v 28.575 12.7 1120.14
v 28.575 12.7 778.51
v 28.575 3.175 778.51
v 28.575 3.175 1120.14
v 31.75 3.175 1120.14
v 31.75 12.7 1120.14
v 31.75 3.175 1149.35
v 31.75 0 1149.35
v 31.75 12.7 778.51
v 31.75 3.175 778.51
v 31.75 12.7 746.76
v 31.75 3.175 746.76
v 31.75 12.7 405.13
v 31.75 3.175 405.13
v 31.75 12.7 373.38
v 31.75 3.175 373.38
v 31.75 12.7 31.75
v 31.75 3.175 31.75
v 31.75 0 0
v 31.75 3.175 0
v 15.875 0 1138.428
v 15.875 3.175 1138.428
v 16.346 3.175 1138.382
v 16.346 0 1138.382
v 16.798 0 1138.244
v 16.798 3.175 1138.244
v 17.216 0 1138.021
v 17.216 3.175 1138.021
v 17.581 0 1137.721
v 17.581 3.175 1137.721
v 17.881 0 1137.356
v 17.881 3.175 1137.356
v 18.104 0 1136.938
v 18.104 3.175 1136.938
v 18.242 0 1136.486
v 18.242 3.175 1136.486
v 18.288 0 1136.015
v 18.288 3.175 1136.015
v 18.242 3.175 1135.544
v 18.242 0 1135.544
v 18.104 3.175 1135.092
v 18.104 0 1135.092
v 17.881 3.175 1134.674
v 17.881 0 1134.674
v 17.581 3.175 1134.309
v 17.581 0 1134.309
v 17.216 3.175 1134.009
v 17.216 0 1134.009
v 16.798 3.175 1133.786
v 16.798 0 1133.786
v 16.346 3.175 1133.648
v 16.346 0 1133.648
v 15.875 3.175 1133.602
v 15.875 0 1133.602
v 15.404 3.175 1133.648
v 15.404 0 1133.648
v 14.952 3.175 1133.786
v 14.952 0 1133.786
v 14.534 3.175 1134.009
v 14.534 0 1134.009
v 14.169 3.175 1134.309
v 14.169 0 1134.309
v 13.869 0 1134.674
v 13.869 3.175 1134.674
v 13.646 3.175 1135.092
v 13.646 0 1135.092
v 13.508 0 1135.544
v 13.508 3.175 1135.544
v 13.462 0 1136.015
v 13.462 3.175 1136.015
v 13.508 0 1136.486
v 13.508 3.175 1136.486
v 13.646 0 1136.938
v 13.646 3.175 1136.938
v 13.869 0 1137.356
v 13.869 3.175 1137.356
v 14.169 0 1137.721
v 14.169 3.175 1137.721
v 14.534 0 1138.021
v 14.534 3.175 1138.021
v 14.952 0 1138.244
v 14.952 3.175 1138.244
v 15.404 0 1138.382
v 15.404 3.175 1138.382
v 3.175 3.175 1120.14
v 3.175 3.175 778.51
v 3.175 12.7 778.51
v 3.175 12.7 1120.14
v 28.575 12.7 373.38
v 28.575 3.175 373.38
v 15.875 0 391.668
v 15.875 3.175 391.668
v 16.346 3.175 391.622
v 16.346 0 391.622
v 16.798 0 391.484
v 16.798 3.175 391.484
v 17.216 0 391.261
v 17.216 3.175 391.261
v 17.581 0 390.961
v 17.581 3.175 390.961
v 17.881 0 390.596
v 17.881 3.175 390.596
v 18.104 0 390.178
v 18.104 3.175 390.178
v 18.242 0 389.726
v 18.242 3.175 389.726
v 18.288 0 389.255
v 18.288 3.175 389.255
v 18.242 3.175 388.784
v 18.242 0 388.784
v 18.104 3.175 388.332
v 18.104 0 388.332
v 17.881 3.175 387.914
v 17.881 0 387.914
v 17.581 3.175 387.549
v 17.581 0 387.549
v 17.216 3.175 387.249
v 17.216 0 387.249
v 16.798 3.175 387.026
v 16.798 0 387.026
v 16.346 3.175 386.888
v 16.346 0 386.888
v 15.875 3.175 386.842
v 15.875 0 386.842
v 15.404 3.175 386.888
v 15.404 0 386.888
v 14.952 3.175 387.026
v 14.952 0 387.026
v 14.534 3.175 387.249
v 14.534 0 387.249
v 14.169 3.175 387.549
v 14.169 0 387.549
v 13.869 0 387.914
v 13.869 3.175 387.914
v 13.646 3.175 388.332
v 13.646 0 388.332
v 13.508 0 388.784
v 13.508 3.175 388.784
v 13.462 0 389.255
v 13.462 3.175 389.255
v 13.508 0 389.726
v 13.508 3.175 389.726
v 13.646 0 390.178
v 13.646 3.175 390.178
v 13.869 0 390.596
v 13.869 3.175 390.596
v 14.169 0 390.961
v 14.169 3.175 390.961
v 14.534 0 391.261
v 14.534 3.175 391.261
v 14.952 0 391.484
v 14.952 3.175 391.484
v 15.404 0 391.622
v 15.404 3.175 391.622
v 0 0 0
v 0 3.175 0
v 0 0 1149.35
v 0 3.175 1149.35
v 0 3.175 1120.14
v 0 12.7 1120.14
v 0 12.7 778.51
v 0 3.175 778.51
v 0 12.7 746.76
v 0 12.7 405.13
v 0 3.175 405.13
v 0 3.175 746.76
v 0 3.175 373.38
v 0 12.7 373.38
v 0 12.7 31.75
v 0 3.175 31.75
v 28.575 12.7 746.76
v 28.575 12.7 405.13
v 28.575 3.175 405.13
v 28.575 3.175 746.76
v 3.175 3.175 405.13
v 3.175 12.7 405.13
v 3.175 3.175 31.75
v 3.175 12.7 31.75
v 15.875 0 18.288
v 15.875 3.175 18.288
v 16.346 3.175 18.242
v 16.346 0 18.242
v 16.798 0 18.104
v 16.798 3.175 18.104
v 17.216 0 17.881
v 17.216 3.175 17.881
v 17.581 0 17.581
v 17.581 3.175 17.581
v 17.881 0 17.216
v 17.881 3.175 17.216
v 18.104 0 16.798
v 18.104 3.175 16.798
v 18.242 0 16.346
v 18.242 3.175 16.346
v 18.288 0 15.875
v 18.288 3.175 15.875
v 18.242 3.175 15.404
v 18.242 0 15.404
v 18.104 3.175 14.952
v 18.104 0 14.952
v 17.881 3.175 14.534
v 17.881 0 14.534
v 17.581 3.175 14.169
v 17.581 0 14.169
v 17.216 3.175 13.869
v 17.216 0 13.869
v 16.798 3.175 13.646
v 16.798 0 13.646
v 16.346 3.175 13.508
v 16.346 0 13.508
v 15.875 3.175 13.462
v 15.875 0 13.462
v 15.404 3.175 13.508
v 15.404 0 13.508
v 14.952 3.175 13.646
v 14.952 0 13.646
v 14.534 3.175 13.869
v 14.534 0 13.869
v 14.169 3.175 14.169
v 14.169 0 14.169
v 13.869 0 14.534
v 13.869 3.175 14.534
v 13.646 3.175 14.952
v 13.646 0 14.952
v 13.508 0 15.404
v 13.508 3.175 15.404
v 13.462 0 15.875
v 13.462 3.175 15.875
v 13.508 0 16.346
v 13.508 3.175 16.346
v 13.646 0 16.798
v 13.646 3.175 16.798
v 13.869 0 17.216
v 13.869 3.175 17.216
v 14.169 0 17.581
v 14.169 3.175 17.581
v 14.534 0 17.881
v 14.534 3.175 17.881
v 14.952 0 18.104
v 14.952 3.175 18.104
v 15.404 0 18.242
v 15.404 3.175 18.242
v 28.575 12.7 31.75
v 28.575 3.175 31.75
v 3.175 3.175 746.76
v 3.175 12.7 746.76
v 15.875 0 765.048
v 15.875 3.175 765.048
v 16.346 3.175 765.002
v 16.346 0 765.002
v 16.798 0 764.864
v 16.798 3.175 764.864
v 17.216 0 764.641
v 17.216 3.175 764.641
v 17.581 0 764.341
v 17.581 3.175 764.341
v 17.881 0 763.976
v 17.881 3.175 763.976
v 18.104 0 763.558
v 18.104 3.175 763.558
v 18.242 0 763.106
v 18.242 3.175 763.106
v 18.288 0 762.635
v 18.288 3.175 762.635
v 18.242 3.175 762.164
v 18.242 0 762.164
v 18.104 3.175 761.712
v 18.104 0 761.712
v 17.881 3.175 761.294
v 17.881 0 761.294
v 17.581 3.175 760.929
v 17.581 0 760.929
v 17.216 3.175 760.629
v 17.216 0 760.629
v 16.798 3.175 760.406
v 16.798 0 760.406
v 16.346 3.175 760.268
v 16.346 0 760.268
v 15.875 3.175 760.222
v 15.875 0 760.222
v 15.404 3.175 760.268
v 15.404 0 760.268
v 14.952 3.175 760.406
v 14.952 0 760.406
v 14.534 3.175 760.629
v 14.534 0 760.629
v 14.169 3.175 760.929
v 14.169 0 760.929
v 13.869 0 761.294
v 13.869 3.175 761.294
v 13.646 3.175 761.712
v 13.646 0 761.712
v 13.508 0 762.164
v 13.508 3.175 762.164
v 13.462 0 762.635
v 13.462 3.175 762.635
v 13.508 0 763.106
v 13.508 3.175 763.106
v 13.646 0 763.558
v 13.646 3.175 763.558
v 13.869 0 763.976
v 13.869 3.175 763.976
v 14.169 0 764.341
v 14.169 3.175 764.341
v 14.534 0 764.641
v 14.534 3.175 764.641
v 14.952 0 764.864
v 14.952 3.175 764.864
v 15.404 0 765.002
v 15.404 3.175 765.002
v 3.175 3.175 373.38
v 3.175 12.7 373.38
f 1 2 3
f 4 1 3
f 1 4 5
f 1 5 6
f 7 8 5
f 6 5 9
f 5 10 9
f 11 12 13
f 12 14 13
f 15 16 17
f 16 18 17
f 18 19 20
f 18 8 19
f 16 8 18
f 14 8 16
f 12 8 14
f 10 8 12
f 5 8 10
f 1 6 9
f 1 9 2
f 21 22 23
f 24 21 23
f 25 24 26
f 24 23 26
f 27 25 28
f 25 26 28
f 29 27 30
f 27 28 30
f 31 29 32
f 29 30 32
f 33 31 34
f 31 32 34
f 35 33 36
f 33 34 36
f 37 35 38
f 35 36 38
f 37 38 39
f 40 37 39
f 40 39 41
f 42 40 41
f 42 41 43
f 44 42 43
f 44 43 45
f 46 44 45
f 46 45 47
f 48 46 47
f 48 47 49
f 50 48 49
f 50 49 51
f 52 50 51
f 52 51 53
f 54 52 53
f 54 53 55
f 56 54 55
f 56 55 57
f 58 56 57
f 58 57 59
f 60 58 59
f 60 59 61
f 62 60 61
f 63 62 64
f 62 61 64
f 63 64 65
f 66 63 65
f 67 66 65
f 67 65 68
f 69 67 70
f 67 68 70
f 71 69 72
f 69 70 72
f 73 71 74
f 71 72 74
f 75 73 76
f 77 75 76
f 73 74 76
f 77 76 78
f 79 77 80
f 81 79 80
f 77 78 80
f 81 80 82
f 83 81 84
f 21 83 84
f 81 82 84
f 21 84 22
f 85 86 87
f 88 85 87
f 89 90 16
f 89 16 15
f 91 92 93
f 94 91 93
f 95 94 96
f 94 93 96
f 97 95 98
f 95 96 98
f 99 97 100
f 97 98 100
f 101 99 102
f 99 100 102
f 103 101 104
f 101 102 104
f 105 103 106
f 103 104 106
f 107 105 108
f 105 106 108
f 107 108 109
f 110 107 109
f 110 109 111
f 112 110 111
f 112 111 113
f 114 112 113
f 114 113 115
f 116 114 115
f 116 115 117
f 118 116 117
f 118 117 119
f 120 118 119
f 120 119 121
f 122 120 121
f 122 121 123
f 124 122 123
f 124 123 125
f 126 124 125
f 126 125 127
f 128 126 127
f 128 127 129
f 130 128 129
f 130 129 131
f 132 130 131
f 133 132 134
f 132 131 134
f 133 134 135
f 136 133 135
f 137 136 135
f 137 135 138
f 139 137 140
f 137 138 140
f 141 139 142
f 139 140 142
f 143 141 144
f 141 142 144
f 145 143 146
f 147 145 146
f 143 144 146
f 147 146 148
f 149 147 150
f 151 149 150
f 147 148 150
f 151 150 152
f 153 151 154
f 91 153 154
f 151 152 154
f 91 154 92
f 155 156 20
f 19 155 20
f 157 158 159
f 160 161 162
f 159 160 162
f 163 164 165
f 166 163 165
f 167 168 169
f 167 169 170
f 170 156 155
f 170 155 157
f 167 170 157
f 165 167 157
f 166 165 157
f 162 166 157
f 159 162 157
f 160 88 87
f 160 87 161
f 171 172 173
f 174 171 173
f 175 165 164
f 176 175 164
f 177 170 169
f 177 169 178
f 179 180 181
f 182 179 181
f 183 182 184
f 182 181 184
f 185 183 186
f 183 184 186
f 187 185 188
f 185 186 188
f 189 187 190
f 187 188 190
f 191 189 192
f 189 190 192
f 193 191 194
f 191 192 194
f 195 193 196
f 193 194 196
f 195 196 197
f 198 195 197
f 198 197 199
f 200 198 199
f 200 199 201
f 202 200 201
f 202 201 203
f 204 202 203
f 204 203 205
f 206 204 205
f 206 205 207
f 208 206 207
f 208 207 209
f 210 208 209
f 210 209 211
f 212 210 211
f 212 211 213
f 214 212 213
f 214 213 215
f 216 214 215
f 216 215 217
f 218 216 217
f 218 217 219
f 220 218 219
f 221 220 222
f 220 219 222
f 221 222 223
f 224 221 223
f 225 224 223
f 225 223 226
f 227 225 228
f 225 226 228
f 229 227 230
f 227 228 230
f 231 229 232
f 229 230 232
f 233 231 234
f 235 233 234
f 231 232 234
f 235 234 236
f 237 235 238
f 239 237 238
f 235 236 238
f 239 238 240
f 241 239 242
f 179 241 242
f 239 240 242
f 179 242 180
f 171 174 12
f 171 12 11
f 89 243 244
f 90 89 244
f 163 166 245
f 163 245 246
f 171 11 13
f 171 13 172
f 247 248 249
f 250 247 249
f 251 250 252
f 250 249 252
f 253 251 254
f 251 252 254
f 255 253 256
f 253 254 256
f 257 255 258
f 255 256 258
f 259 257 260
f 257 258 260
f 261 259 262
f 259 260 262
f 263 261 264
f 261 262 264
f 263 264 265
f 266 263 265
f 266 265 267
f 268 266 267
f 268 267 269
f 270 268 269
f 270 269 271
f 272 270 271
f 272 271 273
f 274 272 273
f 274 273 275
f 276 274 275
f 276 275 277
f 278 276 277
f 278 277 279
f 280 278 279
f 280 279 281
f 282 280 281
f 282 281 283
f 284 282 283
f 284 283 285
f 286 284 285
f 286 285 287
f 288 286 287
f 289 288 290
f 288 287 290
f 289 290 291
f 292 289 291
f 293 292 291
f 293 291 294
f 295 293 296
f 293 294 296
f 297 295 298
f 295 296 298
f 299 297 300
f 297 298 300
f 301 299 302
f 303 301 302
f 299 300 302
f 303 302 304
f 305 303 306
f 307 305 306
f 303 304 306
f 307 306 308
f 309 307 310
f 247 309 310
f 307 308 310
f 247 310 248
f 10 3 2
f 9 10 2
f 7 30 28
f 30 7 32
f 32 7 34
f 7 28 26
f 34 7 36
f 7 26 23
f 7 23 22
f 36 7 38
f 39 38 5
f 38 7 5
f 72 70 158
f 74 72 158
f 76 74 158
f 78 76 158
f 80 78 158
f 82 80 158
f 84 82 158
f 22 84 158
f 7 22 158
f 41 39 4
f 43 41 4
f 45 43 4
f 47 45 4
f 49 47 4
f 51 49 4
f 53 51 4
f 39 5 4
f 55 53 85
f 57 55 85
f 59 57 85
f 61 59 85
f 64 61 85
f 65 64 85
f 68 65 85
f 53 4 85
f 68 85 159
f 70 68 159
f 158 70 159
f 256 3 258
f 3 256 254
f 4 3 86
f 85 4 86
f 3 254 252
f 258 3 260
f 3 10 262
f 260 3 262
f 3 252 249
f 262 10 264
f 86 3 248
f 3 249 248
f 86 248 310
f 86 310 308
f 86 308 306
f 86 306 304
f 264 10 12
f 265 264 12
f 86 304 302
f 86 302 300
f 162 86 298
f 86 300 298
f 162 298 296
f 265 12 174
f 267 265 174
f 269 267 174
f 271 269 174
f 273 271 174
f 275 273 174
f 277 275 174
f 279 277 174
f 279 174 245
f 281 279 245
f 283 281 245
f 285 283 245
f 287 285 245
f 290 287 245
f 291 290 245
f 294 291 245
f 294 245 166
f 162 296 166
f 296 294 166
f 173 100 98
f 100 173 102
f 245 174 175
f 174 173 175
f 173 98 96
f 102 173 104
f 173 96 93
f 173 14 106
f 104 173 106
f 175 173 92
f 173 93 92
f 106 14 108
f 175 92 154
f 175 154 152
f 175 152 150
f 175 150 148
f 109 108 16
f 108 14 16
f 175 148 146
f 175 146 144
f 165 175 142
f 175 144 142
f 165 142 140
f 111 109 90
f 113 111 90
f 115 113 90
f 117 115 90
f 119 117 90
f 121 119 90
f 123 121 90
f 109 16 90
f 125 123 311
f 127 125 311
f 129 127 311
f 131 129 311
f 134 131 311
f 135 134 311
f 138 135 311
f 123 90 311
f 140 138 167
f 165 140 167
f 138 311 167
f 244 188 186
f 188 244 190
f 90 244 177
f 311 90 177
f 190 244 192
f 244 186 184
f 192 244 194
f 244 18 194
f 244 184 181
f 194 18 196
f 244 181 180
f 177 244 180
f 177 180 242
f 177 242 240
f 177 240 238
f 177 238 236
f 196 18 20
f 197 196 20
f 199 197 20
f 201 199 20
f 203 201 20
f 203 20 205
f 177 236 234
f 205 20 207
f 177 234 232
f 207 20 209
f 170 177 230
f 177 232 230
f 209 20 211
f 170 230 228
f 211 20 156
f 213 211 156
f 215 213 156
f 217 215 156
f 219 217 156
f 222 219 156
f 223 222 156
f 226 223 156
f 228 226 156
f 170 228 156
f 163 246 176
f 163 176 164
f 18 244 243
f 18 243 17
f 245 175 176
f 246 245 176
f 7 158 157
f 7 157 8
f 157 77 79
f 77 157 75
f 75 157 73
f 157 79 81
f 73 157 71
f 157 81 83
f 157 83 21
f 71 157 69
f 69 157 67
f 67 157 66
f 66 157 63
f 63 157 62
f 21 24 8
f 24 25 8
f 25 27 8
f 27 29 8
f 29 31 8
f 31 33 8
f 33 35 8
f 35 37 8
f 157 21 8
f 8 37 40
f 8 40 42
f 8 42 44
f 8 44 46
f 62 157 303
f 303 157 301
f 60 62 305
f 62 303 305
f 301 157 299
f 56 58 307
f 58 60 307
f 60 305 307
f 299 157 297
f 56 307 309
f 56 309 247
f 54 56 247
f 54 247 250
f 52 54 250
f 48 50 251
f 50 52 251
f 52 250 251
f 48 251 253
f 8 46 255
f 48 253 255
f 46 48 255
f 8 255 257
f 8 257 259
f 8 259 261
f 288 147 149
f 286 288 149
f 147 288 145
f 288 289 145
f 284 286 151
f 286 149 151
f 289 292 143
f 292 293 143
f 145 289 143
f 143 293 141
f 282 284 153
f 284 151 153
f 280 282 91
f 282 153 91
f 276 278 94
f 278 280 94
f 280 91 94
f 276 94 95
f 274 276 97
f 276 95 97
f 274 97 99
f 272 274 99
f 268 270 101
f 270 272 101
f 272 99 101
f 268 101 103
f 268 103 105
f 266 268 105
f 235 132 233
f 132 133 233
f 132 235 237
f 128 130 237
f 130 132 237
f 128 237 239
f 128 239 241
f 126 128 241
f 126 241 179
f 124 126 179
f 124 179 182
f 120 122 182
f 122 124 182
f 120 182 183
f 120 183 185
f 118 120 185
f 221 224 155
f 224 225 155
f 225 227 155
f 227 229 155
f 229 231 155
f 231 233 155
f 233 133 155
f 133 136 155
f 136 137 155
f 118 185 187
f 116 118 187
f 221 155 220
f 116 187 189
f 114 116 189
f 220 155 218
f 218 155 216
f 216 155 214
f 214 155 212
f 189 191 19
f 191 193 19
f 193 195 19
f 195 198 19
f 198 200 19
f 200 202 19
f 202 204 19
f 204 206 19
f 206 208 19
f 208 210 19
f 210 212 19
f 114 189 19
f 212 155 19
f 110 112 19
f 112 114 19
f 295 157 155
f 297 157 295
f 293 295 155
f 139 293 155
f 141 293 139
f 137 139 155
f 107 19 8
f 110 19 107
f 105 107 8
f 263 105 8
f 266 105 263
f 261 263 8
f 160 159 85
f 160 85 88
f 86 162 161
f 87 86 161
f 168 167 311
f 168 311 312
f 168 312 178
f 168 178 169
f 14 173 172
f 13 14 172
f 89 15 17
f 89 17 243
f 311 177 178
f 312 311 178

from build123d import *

# Parameters (mm, degrees)
BOSS_EXTRUDE1_DEPTH = 1149.35
SKETCH2_W           = 132.323055729
SKETCH2_H           = 87.040299976
CUT_EXTRUDE1_DEPTH  = 9.525
SKETCH3_W           = 31.75
SKETCH3_H           = 12.7
CUT_EXTRUDE2_DEPTH  = 1150.858589132
SKETCH4_W           = 31.75
SKETCH4_H           = 12.7
CUT_EXTRUDE3_DEPTH  = 1150.858589132
SKETCH5_W           = 31.75
SKETCH5_H           = 12.7
CUT_EXTRUDE4_DEPTH  = 1150.858589132
CUT_EXTRUDE5_REACH  = 1151.828
SKETCH6_R           = 2.413


with BuildPart() as part:
    # Sketch1 → Boss-Extrude1 (new body)
    with BuildSketch(Plane.XY):
        Polygon((3.175, 3.175), (3.175, 12.7), (0, 12.7), (0, 0), (31.75, 0), (31.75, 12.7), (28.575, 12.7), (28.575, 3.175), align=None)
    extrude(amount=BOSS_EXTRUDE1_DEPTH)

    # Sketch2 → Cut-Extrude1 (cut)
    with BuildSketch(Plane(origin=(0, 3.175, 0), x_dir=(1, 0, 0), z_dir=(0, 1, 0))):
        with Locations((4.885698681, 11.770149988)):
            Rectangle(SKETCH2_W, SKETCH2_H)
    extrude(amount=CUT_EXTRUDE1_DEPTH, mode=Mode.SUBTRACT)

    # Sketch3 → Cut-Extrude2 (cut, through all)
    with BuildSketch(Plane.ZY):
        with Locations((389.255, 9.525)):
            Rectangle(SKETCH3_W, SKETCH3_H)
    extrude(amount=-CUT_EXTRUDE2_DEPTH, mode=Mode.SUBTRACT)

    # Sketch4 → Cut-Extrude3 (cut, through all)
    with BuildSketch(Plane.ZY):
        with Locations((762.635, 9.525)):
            Rectangle(SKETCH4_W, SKETCH4_H)
    extrude(amount=-CUT_EXTRUDE3_DEPTH, mode=Mode.SUBTRACT)

    # Sketch5 → Cut-Extrude4 (cut, through all)
    with BuildSketch(Plane.ZY):
        with Locations((1136.015, 9.525)):
            Rectangle(SKETCH5_W, SKETCH5_H)
    extrude(amount=-CUT_EXTRUDE4_DEPTH, mode=Mode.SUBTRACT)

    # Sketch6 → Cut-Extrude5 (cut, up to next)
    with BuildSketch(Plane(origin=(0, 3.175, 0), x_dir=(1, 0, 0), z_dir=(0, 1, 0)), mode=Mode.PRIVATE) as cut_extrude5_sk1:
        with Locations(Location((15.875, -15.875, 0), (0, 0, 270))):
            Circle(SKETCH6_R)
    cut_extrude5_tool1 = extrude(cut_extrude5_sk1.sketch, amount=-CUT_EXTRUDE5_REACH, mode=Mode.PRIVATE) & part.part
    # Sketch6 → Cut-Extrude5 (cut, up to next)
    with BuildSketch(Plane(origin=(0, 3.175, 0), x_dir=(1, 0, 0), z_dir=(0, 1, 0)), mode=Mode.PRIVATE) as cut_extrude5_sk2:
        with Locations(Location((15.875, -389.255, 0), (0, 0, 270))):
            Circle(SKETCH6_R)
    cut_extrude5_tool2 = extrude(cut_extrude5_sk2.sketch, amount=-CUT_EXTRUDE5_REACH, mode=Mode.PRIVATE) & part.part
    # Sketch6 → Cut-Extrude5 (cut, up to next)
    with BuildSketch(Plane(origin=(0, 3.175, 0), x_dir=(1, 0, 0), z_dir=(0, 1, 0)), mode=Mode.PRIVATE) as cut_extrude5_sk3:
        with Locations(Location((15.875, -762.635, 0), (0, 0, 270))):
            Circle(SKETCH6_R)
    cut_extrude5_tool3 = extrude(cut_extrude5_sk3.sketch, amount=-CUT_EXTRUDE5_REACH, mode=Mode.PRIVATE) & part.part
    # Sketch6 → Cut-Extrude5 (cut, up to next)
    with BuildSketch(Plane(origin=(0, 3.175, 0), x_dir=(1, 0, 0), z_dir=(0, 1, 0)), mode=Mode.PRIVATE) as cut_extrude5_sk4:
        with Locations(Location((15.875, -1136.015, 0), (0, 0, 270))):
            Circle(SKETCH6_R)
    cut_extrude5_tool4 = extrude(cut_extrude5_sk4.sketch, amount=-CUT_EXTRUDE5_REACH, mode=Mode.PRIVATE) & part.part
    add(cut_extrude5_tool1.solids().sort_by_distance((15.875, 3.175, 15.875))[0], mode=Mode.SUBTRACT)
    add(cut_extrude5_tool2.solids().sort_by_distance((15.875, 3.175, 389.255))[0], mode=Mode.SUBTRACT)
    add(cut_extrude5_tool3.solids().sort_by_distance((15.875, 3.175, 762.635))[0], mode=Mode.SUBTRACT)
    add(cut_extrude5_tool4.solids().sort_by_distance((15.875, 3.175, 1136.015))[0], mode=Mode.SUBTRACT)


solid = part.part
